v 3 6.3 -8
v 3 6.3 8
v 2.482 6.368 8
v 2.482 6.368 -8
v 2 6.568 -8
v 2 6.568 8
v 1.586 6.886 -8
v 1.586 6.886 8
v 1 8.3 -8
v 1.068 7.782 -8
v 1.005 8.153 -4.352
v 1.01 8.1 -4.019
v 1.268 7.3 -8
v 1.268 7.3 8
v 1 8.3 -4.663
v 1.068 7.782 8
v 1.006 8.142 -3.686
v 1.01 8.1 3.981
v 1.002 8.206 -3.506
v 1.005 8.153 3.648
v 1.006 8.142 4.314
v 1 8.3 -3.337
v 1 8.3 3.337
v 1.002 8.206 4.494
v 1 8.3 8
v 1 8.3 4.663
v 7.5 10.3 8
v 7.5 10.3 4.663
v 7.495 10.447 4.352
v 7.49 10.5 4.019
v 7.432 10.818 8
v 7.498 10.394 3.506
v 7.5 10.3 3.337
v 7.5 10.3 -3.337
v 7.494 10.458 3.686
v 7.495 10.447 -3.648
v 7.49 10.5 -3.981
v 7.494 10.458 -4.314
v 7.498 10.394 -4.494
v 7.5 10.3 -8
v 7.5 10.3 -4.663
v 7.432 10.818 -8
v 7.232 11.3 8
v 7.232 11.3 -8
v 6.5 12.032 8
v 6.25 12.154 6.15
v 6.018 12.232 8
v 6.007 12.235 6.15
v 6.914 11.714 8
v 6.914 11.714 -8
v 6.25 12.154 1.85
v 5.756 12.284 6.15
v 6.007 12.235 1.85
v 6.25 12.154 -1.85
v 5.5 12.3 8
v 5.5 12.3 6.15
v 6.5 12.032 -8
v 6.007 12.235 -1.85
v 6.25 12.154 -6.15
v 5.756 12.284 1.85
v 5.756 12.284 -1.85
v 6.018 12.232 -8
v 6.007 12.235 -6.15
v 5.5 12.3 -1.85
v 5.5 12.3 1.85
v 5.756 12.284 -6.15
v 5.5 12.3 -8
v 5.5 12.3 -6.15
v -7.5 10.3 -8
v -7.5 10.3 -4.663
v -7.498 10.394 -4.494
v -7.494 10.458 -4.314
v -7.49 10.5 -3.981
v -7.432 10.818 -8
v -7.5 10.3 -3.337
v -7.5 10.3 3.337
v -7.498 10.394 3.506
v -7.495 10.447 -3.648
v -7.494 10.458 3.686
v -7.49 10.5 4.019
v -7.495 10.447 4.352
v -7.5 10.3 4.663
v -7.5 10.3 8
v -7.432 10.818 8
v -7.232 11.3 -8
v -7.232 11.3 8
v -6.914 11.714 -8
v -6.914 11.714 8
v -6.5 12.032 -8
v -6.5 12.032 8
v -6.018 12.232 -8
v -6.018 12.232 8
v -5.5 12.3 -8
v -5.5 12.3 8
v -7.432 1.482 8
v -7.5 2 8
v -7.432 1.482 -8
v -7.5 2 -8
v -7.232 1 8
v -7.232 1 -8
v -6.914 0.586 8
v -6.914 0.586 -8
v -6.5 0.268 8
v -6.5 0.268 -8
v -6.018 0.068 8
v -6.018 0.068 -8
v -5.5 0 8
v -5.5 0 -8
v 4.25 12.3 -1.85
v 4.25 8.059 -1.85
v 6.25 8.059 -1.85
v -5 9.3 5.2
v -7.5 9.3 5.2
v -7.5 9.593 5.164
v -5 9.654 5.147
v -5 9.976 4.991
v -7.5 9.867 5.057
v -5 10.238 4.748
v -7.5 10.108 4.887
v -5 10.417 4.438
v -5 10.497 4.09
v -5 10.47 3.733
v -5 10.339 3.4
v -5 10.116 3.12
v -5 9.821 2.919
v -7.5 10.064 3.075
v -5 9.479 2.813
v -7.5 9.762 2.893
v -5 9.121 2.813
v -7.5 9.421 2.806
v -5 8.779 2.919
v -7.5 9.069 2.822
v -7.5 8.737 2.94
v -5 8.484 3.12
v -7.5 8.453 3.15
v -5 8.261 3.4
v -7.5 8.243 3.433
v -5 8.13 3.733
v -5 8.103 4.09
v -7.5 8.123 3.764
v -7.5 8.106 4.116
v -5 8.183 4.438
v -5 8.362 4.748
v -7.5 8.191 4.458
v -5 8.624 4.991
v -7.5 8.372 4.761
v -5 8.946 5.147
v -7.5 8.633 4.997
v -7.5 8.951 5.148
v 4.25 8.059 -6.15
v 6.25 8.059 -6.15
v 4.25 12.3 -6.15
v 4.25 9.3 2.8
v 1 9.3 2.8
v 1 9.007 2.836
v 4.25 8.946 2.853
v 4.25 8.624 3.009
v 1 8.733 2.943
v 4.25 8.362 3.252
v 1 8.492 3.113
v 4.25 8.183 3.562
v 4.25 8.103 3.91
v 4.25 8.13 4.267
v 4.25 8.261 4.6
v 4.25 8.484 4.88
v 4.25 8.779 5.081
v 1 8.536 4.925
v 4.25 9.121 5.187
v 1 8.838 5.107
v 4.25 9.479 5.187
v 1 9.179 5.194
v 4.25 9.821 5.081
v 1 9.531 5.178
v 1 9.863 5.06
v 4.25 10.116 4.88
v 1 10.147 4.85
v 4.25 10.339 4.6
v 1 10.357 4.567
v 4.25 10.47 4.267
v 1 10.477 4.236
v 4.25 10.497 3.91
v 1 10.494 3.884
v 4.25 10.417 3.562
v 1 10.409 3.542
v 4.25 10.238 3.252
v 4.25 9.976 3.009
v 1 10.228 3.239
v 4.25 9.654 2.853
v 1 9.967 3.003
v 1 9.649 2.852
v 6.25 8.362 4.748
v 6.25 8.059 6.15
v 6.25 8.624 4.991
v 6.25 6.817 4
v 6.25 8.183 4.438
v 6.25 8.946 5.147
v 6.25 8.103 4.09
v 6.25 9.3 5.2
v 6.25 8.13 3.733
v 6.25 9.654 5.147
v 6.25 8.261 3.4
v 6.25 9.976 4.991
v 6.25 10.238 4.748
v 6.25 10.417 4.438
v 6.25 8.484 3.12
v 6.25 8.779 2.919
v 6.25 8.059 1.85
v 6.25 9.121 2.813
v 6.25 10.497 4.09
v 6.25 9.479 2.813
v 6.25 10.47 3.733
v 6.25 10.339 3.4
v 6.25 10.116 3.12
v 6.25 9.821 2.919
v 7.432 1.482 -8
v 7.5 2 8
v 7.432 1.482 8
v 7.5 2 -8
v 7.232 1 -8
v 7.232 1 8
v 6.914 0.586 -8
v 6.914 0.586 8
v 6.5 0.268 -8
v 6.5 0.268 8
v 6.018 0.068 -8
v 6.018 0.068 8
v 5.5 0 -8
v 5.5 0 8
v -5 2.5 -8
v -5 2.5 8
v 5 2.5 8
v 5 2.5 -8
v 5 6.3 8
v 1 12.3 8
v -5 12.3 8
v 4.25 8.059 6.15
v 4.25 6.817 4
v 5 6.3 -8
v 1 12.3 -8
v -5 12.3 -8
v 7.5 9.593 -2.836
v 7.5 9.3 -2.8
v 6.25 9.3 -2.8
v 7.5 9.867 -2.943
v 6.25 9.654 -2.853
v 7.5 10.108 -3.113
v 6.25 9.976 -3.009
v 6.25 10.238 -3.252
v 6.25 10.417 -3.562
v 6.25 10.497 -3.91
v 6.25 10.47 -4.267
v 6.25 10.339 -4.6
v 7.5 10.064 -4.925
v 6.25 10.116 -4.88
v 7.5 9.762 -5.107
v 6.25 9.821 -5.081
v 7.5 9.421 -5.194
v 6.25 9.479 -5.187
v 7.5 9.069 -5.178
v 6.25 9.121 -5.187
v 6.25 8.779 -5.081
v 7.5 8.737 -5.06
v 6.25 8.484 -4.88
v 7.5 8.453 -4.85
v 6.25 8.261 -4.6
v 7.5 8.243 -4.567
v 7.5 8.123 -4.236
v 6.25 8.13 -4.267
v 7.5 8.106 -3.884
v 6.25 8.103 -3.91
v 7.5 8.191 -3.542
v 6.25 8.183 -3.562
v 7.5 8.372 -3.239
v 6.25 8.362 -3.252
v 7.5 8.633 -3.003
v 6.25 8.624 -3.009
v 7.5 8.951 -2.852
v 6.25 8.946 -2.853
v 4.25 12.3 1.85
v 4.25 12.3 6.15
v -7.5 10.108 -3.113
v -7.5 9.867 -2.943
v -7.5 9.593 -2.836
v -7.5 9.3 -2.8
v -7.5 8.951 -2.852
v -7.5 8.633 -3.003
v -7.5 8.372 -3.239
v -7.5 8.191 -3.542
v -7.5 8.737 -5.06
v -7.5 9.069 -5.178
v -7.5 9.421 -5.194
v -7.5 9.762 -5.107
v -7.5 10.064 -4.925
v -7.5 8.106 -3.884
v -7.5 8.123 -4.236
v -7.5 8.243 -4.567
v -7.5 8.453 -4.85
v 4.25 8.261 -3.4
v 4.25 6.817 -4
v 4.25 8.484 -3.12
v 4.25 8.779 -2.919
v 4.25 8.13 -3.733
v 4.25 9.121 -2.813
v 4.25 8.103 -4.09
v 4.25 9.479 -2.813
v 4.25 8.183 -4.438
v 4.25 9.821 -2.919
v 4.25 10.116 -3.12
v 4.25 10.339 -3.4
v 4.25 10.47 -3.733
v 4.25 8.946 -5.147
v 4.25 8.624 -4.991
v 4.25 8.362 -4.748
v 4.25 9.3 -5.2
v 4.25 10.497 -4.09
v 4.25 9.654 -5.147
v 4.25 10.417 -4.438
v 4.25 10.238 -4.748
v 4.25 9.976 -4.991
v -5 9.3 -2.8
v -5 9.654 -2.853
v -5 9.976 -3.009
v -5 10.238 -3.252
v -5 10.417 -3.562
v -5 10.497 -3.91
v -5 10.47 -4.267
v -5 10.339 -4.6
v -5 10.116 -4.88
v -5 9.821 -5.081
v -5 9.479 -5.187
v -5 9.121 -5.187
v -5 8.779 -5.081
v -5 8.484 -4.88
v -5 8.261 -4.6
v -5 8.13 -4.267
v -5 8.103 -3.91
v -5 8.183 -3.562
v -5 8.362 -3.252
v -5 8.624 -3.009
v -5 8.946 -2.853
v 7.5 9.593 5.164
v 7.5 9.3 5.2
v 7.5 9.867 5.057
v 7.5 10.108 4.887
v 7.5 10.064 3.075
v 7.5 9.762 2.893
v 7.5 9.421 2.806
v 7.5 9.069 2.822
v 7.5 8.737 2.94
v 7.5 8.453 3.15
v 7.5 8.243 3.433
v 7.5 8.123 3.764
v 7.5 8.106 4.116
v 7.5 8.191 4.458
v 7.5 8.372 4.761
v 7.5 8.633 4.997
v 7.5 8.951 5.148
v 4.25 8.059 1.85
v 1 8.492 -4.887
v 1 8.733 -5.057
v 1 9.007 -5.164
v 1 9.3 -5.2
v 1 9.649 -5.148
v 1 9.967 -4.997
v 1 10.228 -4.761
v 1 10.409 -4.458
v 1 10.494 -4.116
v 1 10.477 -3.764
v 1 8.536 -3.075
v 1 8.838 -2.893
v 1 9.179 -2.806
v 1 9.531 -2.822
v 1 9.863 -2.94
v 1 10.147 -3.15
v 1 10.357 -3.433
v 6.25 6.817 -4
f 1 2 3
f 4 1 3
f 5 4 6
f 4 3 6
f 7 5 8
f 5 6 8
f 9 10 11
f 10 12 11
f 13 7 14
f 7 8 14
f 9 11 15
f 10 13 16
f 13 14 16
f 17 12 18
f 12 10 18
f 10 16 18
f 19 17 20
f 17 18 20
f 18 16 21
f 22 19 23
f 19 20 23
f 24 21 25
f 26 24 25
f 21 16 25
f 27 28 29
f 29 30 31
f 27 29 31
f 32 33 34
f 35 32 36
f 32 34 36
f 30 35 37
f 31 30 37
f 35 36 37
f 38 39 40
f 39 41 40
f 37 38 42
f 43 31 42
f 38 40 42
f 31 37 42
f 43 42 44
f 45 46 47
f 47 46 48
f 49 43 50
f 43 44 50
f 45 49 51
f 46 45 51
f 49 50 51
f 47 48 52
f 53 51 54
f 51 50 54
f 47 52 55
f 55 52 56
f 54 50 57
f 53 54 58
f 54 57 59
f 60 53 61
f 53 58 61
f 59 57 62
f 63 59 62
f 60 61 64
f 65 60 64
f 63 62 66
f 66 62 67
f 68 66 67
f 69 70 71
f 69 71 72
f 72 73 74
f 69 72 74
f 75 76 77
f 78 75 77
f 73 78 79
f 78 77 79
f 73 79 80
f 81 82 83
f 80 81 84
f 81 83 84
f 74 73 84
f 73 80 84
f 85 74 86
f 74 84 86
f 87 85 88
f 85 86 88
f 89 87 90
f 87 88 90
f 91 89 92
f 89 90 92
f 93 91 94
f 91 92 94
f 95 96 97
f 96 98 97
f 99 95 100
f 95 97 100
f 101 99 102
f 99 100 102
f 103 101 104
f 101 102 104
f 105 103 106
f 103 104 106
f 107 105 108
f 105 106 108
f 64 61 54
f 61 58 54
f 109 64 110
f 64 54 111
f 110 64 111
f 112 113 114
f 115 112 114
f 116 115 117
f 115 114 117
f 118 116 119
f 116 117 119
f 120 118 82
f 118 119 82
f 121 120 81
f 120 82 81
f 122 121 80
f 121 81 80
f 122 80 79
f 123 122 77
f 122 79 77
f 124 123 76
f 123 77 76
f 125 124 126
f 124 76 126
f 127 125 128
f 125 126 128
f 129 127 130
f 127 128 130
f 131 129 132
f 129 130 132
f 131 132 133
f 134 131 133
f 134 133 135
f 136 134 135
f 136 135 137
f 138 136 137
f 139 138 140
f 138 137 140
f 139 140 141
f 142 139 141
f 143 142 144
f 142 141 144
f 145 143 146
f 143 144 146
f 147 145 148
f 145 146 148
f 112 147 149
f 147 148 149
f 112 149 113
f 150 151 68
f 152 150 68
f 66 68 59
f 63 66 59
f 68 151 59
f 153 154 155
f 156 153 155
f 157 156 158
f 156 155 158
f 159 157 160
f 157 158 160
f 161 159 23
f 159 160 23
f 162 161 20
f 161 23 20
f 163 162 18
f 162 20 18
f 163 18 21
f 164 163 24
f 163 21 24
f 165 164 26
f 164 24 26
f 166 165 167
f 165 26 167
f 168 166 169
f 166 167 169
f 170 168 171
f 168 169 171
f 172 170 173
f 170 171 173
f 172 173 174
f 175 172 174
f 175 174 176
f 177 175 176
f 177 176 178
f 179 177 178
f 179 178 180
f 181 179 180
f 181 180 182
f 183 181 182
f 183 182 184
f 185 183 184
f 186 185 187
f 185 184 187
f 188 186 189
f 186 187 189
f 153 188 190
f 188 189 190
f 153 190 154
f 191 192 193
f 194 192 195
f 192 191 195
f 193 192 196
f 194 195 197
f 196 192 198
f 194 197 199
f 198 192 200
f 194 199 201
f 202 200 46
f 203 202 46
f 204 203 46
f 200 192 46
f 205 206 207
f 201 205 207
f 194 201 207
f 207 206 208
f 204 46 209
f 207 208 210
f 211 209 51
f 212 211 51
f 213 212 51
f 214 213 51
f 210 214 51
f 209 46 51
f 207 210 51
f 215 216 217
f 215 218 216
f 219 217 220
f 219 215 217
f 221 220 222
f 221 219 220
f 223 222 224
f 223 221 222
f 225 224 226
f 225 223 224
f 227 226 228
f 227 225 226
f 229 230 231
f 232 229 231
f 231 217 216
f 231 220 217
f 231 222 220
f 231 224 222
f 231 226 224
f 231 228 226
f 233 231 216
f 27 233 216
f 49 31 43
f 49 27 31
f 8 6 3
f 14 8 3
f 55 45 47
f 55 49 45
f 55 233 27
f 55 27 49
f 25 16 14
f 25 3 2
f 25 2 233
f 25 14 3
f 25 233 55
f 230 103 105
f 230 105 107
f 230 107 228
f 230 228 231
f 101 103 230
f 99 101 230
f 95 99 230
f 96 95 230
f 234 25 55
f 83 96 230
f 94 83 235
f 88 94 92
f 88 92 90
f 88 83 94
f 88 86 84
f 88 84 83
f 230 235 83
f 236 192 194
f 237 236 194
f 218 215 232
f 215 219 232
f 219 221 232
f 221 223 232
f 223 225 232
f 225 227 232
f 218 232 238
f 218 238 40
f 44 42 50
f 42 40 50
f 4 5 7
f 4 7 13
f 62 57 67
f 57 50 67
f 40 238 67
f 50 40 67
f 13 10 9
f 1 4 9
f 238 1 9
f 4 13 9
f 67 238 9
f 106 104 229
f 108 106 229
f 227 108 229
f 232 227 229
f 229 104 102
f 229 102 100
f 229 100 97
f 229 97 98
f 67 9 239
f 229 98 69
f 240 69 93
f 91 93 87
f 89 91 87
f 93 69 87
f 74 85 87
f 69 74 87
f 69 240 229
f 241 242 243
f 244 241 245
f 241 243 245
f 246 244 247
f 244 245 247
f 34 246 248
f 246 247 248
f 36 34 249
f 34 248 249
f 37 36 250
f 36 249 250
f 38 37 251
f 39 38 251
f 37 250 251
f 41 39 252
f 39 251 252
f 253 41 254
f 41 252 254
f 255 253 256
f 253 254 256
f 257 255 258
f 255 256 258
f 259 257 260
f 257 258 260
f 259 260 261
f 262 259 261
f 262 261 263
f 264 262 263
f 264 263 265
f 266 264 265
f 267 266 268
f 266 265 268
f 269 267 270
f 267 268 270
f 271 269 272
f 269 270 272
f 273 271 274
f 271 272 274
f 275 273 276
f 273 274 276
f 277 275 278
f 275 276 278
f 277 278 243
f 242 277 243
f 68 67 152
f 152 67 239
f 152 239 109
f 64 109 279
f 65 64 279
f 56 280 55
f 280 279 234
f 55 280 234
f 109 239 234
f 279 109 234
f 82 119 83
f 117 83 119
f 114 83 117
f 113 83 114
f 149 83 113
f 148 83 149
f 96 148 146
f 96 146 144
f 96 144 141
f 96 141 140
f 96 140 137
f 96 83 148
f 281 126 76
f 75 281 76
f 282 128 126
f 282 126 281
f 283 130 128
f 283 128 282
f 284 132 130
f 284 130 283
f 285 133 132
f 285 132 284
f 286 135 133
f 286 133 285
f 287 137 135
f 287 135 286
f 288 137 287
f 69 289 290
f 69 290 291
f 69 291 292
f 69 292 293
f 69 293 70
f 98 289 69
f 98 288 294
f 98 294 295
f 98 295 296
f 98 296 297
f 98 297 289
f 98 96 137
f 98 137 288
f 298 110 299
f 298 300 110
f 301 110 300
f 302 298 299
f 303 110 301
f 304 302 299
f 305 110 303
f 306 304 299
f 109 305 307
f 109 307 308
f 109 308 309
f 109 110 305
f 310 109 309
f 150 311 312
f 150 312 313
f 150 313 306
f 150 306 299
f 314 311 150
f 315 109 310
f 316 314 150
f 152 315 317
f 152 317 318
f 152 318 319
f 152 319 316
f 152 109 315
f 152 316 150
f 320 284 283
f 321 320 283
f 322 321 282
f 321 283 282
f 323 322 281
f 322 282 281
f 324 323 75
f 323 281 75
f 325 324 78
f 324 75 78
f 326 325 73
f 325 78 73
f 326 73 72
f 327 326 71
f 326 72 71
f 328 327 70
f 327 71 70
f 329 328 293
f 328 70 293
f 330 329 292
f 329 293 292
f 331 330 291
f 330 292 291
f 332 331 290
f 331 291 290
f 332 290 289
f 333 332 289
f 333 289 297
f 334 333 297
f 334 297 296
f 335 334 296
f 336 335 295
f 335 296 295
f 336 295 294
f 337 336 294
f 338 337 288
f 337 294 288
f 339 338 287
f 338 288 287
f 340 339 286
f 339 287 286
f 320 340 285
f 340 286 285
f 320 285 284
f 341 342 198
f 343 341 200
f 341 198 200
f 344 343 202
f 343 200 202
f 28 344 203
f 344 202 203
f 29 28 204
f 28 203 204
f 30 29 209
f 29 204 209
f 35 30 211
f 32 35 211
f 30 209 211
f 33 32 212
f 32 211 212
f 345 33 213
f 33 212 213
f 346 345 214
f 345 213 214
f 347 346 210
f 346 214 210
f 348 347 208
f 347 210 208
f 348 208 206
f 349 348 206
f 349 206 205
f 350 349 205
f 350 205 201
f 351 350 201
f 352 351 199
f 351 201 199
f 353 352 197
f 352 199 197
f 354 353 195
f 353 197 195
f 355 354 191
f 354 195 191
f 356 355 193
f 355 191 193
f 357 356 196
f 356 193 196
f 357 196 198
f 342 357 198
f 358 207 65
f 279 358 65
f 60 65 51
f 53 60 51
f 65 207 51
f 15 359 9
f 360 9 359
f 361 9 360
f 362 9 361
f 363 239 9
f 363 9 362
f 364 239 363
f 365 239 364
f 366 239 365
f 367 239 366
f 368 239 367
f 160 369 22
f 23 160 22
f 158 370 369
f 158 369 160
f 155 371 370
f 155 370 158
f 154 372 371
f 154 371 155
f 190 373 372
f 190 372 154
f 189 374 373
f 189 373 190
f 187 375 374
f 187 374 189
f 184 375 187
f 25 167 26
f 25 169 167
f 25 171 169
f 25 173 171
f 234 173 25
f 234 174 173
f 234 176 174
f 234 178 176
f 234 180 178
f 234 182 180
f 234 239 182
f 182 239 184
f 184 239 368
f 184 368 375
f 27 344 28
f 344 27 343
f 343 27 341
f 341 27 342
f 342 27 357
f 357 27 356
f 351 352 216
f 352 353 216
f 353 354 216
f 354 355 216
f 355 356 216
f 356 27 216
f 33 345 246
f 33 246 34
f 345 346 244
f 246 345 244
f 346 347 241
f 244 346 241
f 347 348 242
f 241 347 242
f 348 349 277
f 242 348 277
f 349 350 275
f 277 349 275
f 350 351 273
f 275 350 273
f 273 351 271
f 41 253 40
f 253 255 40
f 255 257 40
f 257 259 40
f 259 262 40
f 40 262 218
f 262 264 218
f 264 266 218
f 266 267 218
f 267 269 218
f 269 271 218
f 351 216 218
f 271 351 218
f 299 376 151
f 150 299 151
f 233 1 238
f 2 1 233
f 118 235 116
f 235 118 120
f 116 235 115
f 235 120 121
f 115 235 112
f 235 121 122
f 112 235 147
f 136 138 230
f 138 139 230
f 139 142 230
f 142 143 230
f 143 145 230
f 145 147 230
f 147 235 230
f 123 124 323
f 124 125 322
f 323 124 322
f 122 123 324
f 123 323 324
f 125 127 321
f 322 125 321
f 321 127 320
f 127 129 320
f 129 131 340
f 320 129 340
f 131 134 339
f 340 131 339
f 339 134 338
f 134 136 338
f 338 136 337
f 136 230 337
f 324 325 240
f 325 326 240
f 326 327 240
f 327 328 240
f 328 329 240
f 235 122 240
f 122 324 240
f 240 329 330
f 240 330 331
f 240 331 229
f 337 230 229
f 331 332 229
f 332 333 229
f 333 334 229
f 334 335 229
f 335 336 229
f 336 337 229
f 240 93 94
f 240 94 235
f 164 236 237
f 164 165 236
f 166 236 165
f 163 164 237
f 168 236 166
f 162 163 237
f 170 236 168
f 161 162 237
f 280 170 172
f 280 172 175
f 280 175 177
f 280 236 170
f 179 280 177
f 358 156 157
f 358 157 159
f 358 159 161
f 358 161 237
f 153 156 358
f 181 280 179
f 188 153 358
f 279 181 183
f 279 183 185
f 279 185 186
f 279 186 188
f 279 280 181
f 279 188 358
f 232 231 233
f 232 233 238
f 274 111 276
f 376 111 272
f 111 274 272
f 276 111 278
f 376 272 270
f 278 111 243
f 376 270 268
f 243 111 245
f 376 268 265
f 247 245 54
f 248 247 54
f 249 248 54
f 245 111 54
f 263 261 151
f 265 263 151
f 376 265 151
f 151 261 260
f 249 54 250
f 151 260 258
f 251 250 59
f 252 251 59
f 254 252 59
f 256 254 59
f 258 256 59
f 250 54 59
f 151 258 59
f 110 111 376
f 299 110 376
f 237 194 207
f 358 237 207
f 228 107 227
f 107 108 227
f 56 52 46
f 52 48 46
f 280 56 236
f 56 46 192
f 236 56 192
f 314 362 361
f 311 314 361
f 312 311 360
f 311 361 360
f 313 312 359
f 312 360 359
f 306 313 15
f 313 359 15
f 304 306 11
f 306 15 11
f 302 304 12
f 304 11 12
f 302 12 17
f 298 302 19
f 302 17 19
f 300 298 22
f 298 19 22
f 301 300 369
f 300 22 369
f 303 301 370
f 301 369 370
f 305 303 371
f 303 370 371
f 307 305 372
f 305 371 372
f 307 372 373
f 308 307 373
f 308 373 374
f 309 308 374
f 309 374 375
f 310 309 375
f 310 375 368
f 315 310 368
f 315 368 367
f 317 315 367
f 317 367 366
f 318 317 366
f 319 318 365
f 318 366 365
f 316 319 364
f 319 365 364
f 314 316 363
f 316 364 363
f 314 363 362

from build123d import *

# Parameters (mm, degrees)
SKETCH3_W                = 15
SKETCH3_H                = 16
BOSS_EXTRUDE1_DEPTH      = 2.5
SKETCH4_W                = 2.5
SKETCH4_H                = 16
BOSS_EXTRUDE2_DEPTH      = 9.8
M2_CLEARANCE_HOLE1_D     = 2.4
M2_CLEARANCE_HOLE1_DEPTH = 15
M2_CLEARANCE_HOLE1_TIP   = 0.721032743
FILLET1_R                = 2
BOSS_EXTRUDE3_START      = 4
SKETCH9_W                = 16
SKETCH9_H                = 6
SKETCH9_R                = 1.2
BOSS_EXTRUDE3_DEPTH      = 4
FILLET2_R                = 2
CUT_EXTRUDE1_START       = -1.25
CUT_EXTRUDE1_DEPTH       = 2


with BuildPart() as part:
    # Sketch3 → Boss-Extrude1 (new body)
    with BuildSketch(Plane(origin=(0, 0, 0), x_dir=(1, 0, 0), z_dir=(0, 1, 0))):
        Rectangle(SKETCH3_W, SKETCH3_H)
    extrude(amount=BOSS_EXTRUDE1_DEPTH)

    # Sketch4 → Boss-Extrude2 (add)
    with BuildSketch(Plane(origin=(0, 2.5, 0), x_dir=(1, 0, 0), z_dir=(0, 1, 0))):
        with Locations((-6.25, 0)):
            Rectangle(SKETCH4_W, SKETCH4_H)
        with Locations((6.25, 0)):
            Rectangle(SKETCH4_W, SKETCH4_H)
    extrude(amount=BOSS_EXTRUDE2_DEPTH)

    # M2 Clearance Hole1
    with Locations(Plane(origin=(7.5, 0, 0), x_dir=(0, 0, -1), z_dir=(1, 0, 0))):
        with Locations((-4, 9.3), (4, 9.3)):
            Hole(M2_CLEARANCE_HOLE1_D / 2, depth=M2_CLEARANCE_HOLE1_DEPTH)
            with Locations((0, 0, -(M2_CLEARANCE_HOLE1_DEPTH + M2_CLEARANCE_HOLE1_TIP / 2))):  # 118° drill point
                Cone(0, M2_CLEARANCE_HOLE1_D / 2, M2_CLEARANCE_HOLE1_TIP, mode=Mode.SUBTRACT)

    # Fillet1
    fillet1_edges = [part.edges().sort_by_distance(p)[0] for p in [
        (-7.5, 0, 0),
        (7.5, 0, 0),
    ]]
    fillet(fillet1_edges, radius=FILLET1_R)

    # Sketch9 → Boss-Extrude3 (add)
    with BuildSketch(Plane.ZY.offset(-5).offset(BOSS_EXTRUDE3_START)):
        with Locations((0, 9.3)):
            Rectangle(SKETCH9_W, SKETCH9_H)
        with Locations(Location((-4, 9.3, 0), (0, 0, 180))):
            Circle(SKETCH9_R, mode=Mode.SUBTRACT)
        with Locations(Location((4, 9.3, 0), (0, 0, 180))):
            Circle(SKETCH9_R, mode=Mode.SUBTRACT)
    extrude(amount=-BOSS_EXTRUDE3_DEPTH)

    # Fillet2
    # the kernel refuses this fillet: 2 mm, written as the material it takes off along each edge
    with BuildSketch(Plane(origin=(-7.5, 12.3, 13), x_dir=(1, 0, 0), z_dir=(0, 0, -1)), Plane(origin=(1, 6.3, 13), x_dir=(0, 1, 0), z_dir=(0, 0, -1))) as fillet2_piece_1:
        with BuildLine():
            CenterArc((FILLET2_R, FILLET2_R), FILLET2_R, 180, 90)
            Line((0, FILLET2_R), (0, 0))
            Line((0, 0), (FILLET2_R, 0))
        make_face()
    extrude(amount=26, mode=Mode.SUBTRACT)
    with BuildSketch(Plane(origin=(7.5, 12.3, -13), x_dir=(0, -1, 0), z_dir=(0, 0, 1))) as fillet2_piece_2:
        with BuildLine():
            CenterArc((FILLET2_R, -FILLET2_R), FILLET2_R, 90, 90)
            Line((0, -FILLET2_R), (0, 0))
            Line((0, 0), (FILLET2_R, 0))
        make_face()
    extrude(amount=26, mode=Mode.SUBTRACT)

    # Sketch10 → Cut-Extrude1 (cut)
    with BuildSketch(Plane(origin=(7.5, 0, 0), x_dir=(0, 0, -1), z_dir=(1, 0, 0)).offset(CUT_EXTRUDE1_START)):
        Polygon((-4, 6.817393842), (-1.85, 8.058696921), (-1.85, 10.541303079), (-1.85, 12.3), (-6.15, 12.3), (-6.15, 10.541303079), (-6.15, 8.058696921), align=None)
        Polygon((4, 6.817393842), (6.15, 8.058696921), (6.15, 10.541303079), (6.15, 12.3), (1.85, 12.3), (1.85, 10.541303079), (1.85, 8.058696921), align=None)
    extrude(amount=-CUT_EXTRUDE1_DEPTH, mode=Mode.SUBTRACT)


solid = part.part
